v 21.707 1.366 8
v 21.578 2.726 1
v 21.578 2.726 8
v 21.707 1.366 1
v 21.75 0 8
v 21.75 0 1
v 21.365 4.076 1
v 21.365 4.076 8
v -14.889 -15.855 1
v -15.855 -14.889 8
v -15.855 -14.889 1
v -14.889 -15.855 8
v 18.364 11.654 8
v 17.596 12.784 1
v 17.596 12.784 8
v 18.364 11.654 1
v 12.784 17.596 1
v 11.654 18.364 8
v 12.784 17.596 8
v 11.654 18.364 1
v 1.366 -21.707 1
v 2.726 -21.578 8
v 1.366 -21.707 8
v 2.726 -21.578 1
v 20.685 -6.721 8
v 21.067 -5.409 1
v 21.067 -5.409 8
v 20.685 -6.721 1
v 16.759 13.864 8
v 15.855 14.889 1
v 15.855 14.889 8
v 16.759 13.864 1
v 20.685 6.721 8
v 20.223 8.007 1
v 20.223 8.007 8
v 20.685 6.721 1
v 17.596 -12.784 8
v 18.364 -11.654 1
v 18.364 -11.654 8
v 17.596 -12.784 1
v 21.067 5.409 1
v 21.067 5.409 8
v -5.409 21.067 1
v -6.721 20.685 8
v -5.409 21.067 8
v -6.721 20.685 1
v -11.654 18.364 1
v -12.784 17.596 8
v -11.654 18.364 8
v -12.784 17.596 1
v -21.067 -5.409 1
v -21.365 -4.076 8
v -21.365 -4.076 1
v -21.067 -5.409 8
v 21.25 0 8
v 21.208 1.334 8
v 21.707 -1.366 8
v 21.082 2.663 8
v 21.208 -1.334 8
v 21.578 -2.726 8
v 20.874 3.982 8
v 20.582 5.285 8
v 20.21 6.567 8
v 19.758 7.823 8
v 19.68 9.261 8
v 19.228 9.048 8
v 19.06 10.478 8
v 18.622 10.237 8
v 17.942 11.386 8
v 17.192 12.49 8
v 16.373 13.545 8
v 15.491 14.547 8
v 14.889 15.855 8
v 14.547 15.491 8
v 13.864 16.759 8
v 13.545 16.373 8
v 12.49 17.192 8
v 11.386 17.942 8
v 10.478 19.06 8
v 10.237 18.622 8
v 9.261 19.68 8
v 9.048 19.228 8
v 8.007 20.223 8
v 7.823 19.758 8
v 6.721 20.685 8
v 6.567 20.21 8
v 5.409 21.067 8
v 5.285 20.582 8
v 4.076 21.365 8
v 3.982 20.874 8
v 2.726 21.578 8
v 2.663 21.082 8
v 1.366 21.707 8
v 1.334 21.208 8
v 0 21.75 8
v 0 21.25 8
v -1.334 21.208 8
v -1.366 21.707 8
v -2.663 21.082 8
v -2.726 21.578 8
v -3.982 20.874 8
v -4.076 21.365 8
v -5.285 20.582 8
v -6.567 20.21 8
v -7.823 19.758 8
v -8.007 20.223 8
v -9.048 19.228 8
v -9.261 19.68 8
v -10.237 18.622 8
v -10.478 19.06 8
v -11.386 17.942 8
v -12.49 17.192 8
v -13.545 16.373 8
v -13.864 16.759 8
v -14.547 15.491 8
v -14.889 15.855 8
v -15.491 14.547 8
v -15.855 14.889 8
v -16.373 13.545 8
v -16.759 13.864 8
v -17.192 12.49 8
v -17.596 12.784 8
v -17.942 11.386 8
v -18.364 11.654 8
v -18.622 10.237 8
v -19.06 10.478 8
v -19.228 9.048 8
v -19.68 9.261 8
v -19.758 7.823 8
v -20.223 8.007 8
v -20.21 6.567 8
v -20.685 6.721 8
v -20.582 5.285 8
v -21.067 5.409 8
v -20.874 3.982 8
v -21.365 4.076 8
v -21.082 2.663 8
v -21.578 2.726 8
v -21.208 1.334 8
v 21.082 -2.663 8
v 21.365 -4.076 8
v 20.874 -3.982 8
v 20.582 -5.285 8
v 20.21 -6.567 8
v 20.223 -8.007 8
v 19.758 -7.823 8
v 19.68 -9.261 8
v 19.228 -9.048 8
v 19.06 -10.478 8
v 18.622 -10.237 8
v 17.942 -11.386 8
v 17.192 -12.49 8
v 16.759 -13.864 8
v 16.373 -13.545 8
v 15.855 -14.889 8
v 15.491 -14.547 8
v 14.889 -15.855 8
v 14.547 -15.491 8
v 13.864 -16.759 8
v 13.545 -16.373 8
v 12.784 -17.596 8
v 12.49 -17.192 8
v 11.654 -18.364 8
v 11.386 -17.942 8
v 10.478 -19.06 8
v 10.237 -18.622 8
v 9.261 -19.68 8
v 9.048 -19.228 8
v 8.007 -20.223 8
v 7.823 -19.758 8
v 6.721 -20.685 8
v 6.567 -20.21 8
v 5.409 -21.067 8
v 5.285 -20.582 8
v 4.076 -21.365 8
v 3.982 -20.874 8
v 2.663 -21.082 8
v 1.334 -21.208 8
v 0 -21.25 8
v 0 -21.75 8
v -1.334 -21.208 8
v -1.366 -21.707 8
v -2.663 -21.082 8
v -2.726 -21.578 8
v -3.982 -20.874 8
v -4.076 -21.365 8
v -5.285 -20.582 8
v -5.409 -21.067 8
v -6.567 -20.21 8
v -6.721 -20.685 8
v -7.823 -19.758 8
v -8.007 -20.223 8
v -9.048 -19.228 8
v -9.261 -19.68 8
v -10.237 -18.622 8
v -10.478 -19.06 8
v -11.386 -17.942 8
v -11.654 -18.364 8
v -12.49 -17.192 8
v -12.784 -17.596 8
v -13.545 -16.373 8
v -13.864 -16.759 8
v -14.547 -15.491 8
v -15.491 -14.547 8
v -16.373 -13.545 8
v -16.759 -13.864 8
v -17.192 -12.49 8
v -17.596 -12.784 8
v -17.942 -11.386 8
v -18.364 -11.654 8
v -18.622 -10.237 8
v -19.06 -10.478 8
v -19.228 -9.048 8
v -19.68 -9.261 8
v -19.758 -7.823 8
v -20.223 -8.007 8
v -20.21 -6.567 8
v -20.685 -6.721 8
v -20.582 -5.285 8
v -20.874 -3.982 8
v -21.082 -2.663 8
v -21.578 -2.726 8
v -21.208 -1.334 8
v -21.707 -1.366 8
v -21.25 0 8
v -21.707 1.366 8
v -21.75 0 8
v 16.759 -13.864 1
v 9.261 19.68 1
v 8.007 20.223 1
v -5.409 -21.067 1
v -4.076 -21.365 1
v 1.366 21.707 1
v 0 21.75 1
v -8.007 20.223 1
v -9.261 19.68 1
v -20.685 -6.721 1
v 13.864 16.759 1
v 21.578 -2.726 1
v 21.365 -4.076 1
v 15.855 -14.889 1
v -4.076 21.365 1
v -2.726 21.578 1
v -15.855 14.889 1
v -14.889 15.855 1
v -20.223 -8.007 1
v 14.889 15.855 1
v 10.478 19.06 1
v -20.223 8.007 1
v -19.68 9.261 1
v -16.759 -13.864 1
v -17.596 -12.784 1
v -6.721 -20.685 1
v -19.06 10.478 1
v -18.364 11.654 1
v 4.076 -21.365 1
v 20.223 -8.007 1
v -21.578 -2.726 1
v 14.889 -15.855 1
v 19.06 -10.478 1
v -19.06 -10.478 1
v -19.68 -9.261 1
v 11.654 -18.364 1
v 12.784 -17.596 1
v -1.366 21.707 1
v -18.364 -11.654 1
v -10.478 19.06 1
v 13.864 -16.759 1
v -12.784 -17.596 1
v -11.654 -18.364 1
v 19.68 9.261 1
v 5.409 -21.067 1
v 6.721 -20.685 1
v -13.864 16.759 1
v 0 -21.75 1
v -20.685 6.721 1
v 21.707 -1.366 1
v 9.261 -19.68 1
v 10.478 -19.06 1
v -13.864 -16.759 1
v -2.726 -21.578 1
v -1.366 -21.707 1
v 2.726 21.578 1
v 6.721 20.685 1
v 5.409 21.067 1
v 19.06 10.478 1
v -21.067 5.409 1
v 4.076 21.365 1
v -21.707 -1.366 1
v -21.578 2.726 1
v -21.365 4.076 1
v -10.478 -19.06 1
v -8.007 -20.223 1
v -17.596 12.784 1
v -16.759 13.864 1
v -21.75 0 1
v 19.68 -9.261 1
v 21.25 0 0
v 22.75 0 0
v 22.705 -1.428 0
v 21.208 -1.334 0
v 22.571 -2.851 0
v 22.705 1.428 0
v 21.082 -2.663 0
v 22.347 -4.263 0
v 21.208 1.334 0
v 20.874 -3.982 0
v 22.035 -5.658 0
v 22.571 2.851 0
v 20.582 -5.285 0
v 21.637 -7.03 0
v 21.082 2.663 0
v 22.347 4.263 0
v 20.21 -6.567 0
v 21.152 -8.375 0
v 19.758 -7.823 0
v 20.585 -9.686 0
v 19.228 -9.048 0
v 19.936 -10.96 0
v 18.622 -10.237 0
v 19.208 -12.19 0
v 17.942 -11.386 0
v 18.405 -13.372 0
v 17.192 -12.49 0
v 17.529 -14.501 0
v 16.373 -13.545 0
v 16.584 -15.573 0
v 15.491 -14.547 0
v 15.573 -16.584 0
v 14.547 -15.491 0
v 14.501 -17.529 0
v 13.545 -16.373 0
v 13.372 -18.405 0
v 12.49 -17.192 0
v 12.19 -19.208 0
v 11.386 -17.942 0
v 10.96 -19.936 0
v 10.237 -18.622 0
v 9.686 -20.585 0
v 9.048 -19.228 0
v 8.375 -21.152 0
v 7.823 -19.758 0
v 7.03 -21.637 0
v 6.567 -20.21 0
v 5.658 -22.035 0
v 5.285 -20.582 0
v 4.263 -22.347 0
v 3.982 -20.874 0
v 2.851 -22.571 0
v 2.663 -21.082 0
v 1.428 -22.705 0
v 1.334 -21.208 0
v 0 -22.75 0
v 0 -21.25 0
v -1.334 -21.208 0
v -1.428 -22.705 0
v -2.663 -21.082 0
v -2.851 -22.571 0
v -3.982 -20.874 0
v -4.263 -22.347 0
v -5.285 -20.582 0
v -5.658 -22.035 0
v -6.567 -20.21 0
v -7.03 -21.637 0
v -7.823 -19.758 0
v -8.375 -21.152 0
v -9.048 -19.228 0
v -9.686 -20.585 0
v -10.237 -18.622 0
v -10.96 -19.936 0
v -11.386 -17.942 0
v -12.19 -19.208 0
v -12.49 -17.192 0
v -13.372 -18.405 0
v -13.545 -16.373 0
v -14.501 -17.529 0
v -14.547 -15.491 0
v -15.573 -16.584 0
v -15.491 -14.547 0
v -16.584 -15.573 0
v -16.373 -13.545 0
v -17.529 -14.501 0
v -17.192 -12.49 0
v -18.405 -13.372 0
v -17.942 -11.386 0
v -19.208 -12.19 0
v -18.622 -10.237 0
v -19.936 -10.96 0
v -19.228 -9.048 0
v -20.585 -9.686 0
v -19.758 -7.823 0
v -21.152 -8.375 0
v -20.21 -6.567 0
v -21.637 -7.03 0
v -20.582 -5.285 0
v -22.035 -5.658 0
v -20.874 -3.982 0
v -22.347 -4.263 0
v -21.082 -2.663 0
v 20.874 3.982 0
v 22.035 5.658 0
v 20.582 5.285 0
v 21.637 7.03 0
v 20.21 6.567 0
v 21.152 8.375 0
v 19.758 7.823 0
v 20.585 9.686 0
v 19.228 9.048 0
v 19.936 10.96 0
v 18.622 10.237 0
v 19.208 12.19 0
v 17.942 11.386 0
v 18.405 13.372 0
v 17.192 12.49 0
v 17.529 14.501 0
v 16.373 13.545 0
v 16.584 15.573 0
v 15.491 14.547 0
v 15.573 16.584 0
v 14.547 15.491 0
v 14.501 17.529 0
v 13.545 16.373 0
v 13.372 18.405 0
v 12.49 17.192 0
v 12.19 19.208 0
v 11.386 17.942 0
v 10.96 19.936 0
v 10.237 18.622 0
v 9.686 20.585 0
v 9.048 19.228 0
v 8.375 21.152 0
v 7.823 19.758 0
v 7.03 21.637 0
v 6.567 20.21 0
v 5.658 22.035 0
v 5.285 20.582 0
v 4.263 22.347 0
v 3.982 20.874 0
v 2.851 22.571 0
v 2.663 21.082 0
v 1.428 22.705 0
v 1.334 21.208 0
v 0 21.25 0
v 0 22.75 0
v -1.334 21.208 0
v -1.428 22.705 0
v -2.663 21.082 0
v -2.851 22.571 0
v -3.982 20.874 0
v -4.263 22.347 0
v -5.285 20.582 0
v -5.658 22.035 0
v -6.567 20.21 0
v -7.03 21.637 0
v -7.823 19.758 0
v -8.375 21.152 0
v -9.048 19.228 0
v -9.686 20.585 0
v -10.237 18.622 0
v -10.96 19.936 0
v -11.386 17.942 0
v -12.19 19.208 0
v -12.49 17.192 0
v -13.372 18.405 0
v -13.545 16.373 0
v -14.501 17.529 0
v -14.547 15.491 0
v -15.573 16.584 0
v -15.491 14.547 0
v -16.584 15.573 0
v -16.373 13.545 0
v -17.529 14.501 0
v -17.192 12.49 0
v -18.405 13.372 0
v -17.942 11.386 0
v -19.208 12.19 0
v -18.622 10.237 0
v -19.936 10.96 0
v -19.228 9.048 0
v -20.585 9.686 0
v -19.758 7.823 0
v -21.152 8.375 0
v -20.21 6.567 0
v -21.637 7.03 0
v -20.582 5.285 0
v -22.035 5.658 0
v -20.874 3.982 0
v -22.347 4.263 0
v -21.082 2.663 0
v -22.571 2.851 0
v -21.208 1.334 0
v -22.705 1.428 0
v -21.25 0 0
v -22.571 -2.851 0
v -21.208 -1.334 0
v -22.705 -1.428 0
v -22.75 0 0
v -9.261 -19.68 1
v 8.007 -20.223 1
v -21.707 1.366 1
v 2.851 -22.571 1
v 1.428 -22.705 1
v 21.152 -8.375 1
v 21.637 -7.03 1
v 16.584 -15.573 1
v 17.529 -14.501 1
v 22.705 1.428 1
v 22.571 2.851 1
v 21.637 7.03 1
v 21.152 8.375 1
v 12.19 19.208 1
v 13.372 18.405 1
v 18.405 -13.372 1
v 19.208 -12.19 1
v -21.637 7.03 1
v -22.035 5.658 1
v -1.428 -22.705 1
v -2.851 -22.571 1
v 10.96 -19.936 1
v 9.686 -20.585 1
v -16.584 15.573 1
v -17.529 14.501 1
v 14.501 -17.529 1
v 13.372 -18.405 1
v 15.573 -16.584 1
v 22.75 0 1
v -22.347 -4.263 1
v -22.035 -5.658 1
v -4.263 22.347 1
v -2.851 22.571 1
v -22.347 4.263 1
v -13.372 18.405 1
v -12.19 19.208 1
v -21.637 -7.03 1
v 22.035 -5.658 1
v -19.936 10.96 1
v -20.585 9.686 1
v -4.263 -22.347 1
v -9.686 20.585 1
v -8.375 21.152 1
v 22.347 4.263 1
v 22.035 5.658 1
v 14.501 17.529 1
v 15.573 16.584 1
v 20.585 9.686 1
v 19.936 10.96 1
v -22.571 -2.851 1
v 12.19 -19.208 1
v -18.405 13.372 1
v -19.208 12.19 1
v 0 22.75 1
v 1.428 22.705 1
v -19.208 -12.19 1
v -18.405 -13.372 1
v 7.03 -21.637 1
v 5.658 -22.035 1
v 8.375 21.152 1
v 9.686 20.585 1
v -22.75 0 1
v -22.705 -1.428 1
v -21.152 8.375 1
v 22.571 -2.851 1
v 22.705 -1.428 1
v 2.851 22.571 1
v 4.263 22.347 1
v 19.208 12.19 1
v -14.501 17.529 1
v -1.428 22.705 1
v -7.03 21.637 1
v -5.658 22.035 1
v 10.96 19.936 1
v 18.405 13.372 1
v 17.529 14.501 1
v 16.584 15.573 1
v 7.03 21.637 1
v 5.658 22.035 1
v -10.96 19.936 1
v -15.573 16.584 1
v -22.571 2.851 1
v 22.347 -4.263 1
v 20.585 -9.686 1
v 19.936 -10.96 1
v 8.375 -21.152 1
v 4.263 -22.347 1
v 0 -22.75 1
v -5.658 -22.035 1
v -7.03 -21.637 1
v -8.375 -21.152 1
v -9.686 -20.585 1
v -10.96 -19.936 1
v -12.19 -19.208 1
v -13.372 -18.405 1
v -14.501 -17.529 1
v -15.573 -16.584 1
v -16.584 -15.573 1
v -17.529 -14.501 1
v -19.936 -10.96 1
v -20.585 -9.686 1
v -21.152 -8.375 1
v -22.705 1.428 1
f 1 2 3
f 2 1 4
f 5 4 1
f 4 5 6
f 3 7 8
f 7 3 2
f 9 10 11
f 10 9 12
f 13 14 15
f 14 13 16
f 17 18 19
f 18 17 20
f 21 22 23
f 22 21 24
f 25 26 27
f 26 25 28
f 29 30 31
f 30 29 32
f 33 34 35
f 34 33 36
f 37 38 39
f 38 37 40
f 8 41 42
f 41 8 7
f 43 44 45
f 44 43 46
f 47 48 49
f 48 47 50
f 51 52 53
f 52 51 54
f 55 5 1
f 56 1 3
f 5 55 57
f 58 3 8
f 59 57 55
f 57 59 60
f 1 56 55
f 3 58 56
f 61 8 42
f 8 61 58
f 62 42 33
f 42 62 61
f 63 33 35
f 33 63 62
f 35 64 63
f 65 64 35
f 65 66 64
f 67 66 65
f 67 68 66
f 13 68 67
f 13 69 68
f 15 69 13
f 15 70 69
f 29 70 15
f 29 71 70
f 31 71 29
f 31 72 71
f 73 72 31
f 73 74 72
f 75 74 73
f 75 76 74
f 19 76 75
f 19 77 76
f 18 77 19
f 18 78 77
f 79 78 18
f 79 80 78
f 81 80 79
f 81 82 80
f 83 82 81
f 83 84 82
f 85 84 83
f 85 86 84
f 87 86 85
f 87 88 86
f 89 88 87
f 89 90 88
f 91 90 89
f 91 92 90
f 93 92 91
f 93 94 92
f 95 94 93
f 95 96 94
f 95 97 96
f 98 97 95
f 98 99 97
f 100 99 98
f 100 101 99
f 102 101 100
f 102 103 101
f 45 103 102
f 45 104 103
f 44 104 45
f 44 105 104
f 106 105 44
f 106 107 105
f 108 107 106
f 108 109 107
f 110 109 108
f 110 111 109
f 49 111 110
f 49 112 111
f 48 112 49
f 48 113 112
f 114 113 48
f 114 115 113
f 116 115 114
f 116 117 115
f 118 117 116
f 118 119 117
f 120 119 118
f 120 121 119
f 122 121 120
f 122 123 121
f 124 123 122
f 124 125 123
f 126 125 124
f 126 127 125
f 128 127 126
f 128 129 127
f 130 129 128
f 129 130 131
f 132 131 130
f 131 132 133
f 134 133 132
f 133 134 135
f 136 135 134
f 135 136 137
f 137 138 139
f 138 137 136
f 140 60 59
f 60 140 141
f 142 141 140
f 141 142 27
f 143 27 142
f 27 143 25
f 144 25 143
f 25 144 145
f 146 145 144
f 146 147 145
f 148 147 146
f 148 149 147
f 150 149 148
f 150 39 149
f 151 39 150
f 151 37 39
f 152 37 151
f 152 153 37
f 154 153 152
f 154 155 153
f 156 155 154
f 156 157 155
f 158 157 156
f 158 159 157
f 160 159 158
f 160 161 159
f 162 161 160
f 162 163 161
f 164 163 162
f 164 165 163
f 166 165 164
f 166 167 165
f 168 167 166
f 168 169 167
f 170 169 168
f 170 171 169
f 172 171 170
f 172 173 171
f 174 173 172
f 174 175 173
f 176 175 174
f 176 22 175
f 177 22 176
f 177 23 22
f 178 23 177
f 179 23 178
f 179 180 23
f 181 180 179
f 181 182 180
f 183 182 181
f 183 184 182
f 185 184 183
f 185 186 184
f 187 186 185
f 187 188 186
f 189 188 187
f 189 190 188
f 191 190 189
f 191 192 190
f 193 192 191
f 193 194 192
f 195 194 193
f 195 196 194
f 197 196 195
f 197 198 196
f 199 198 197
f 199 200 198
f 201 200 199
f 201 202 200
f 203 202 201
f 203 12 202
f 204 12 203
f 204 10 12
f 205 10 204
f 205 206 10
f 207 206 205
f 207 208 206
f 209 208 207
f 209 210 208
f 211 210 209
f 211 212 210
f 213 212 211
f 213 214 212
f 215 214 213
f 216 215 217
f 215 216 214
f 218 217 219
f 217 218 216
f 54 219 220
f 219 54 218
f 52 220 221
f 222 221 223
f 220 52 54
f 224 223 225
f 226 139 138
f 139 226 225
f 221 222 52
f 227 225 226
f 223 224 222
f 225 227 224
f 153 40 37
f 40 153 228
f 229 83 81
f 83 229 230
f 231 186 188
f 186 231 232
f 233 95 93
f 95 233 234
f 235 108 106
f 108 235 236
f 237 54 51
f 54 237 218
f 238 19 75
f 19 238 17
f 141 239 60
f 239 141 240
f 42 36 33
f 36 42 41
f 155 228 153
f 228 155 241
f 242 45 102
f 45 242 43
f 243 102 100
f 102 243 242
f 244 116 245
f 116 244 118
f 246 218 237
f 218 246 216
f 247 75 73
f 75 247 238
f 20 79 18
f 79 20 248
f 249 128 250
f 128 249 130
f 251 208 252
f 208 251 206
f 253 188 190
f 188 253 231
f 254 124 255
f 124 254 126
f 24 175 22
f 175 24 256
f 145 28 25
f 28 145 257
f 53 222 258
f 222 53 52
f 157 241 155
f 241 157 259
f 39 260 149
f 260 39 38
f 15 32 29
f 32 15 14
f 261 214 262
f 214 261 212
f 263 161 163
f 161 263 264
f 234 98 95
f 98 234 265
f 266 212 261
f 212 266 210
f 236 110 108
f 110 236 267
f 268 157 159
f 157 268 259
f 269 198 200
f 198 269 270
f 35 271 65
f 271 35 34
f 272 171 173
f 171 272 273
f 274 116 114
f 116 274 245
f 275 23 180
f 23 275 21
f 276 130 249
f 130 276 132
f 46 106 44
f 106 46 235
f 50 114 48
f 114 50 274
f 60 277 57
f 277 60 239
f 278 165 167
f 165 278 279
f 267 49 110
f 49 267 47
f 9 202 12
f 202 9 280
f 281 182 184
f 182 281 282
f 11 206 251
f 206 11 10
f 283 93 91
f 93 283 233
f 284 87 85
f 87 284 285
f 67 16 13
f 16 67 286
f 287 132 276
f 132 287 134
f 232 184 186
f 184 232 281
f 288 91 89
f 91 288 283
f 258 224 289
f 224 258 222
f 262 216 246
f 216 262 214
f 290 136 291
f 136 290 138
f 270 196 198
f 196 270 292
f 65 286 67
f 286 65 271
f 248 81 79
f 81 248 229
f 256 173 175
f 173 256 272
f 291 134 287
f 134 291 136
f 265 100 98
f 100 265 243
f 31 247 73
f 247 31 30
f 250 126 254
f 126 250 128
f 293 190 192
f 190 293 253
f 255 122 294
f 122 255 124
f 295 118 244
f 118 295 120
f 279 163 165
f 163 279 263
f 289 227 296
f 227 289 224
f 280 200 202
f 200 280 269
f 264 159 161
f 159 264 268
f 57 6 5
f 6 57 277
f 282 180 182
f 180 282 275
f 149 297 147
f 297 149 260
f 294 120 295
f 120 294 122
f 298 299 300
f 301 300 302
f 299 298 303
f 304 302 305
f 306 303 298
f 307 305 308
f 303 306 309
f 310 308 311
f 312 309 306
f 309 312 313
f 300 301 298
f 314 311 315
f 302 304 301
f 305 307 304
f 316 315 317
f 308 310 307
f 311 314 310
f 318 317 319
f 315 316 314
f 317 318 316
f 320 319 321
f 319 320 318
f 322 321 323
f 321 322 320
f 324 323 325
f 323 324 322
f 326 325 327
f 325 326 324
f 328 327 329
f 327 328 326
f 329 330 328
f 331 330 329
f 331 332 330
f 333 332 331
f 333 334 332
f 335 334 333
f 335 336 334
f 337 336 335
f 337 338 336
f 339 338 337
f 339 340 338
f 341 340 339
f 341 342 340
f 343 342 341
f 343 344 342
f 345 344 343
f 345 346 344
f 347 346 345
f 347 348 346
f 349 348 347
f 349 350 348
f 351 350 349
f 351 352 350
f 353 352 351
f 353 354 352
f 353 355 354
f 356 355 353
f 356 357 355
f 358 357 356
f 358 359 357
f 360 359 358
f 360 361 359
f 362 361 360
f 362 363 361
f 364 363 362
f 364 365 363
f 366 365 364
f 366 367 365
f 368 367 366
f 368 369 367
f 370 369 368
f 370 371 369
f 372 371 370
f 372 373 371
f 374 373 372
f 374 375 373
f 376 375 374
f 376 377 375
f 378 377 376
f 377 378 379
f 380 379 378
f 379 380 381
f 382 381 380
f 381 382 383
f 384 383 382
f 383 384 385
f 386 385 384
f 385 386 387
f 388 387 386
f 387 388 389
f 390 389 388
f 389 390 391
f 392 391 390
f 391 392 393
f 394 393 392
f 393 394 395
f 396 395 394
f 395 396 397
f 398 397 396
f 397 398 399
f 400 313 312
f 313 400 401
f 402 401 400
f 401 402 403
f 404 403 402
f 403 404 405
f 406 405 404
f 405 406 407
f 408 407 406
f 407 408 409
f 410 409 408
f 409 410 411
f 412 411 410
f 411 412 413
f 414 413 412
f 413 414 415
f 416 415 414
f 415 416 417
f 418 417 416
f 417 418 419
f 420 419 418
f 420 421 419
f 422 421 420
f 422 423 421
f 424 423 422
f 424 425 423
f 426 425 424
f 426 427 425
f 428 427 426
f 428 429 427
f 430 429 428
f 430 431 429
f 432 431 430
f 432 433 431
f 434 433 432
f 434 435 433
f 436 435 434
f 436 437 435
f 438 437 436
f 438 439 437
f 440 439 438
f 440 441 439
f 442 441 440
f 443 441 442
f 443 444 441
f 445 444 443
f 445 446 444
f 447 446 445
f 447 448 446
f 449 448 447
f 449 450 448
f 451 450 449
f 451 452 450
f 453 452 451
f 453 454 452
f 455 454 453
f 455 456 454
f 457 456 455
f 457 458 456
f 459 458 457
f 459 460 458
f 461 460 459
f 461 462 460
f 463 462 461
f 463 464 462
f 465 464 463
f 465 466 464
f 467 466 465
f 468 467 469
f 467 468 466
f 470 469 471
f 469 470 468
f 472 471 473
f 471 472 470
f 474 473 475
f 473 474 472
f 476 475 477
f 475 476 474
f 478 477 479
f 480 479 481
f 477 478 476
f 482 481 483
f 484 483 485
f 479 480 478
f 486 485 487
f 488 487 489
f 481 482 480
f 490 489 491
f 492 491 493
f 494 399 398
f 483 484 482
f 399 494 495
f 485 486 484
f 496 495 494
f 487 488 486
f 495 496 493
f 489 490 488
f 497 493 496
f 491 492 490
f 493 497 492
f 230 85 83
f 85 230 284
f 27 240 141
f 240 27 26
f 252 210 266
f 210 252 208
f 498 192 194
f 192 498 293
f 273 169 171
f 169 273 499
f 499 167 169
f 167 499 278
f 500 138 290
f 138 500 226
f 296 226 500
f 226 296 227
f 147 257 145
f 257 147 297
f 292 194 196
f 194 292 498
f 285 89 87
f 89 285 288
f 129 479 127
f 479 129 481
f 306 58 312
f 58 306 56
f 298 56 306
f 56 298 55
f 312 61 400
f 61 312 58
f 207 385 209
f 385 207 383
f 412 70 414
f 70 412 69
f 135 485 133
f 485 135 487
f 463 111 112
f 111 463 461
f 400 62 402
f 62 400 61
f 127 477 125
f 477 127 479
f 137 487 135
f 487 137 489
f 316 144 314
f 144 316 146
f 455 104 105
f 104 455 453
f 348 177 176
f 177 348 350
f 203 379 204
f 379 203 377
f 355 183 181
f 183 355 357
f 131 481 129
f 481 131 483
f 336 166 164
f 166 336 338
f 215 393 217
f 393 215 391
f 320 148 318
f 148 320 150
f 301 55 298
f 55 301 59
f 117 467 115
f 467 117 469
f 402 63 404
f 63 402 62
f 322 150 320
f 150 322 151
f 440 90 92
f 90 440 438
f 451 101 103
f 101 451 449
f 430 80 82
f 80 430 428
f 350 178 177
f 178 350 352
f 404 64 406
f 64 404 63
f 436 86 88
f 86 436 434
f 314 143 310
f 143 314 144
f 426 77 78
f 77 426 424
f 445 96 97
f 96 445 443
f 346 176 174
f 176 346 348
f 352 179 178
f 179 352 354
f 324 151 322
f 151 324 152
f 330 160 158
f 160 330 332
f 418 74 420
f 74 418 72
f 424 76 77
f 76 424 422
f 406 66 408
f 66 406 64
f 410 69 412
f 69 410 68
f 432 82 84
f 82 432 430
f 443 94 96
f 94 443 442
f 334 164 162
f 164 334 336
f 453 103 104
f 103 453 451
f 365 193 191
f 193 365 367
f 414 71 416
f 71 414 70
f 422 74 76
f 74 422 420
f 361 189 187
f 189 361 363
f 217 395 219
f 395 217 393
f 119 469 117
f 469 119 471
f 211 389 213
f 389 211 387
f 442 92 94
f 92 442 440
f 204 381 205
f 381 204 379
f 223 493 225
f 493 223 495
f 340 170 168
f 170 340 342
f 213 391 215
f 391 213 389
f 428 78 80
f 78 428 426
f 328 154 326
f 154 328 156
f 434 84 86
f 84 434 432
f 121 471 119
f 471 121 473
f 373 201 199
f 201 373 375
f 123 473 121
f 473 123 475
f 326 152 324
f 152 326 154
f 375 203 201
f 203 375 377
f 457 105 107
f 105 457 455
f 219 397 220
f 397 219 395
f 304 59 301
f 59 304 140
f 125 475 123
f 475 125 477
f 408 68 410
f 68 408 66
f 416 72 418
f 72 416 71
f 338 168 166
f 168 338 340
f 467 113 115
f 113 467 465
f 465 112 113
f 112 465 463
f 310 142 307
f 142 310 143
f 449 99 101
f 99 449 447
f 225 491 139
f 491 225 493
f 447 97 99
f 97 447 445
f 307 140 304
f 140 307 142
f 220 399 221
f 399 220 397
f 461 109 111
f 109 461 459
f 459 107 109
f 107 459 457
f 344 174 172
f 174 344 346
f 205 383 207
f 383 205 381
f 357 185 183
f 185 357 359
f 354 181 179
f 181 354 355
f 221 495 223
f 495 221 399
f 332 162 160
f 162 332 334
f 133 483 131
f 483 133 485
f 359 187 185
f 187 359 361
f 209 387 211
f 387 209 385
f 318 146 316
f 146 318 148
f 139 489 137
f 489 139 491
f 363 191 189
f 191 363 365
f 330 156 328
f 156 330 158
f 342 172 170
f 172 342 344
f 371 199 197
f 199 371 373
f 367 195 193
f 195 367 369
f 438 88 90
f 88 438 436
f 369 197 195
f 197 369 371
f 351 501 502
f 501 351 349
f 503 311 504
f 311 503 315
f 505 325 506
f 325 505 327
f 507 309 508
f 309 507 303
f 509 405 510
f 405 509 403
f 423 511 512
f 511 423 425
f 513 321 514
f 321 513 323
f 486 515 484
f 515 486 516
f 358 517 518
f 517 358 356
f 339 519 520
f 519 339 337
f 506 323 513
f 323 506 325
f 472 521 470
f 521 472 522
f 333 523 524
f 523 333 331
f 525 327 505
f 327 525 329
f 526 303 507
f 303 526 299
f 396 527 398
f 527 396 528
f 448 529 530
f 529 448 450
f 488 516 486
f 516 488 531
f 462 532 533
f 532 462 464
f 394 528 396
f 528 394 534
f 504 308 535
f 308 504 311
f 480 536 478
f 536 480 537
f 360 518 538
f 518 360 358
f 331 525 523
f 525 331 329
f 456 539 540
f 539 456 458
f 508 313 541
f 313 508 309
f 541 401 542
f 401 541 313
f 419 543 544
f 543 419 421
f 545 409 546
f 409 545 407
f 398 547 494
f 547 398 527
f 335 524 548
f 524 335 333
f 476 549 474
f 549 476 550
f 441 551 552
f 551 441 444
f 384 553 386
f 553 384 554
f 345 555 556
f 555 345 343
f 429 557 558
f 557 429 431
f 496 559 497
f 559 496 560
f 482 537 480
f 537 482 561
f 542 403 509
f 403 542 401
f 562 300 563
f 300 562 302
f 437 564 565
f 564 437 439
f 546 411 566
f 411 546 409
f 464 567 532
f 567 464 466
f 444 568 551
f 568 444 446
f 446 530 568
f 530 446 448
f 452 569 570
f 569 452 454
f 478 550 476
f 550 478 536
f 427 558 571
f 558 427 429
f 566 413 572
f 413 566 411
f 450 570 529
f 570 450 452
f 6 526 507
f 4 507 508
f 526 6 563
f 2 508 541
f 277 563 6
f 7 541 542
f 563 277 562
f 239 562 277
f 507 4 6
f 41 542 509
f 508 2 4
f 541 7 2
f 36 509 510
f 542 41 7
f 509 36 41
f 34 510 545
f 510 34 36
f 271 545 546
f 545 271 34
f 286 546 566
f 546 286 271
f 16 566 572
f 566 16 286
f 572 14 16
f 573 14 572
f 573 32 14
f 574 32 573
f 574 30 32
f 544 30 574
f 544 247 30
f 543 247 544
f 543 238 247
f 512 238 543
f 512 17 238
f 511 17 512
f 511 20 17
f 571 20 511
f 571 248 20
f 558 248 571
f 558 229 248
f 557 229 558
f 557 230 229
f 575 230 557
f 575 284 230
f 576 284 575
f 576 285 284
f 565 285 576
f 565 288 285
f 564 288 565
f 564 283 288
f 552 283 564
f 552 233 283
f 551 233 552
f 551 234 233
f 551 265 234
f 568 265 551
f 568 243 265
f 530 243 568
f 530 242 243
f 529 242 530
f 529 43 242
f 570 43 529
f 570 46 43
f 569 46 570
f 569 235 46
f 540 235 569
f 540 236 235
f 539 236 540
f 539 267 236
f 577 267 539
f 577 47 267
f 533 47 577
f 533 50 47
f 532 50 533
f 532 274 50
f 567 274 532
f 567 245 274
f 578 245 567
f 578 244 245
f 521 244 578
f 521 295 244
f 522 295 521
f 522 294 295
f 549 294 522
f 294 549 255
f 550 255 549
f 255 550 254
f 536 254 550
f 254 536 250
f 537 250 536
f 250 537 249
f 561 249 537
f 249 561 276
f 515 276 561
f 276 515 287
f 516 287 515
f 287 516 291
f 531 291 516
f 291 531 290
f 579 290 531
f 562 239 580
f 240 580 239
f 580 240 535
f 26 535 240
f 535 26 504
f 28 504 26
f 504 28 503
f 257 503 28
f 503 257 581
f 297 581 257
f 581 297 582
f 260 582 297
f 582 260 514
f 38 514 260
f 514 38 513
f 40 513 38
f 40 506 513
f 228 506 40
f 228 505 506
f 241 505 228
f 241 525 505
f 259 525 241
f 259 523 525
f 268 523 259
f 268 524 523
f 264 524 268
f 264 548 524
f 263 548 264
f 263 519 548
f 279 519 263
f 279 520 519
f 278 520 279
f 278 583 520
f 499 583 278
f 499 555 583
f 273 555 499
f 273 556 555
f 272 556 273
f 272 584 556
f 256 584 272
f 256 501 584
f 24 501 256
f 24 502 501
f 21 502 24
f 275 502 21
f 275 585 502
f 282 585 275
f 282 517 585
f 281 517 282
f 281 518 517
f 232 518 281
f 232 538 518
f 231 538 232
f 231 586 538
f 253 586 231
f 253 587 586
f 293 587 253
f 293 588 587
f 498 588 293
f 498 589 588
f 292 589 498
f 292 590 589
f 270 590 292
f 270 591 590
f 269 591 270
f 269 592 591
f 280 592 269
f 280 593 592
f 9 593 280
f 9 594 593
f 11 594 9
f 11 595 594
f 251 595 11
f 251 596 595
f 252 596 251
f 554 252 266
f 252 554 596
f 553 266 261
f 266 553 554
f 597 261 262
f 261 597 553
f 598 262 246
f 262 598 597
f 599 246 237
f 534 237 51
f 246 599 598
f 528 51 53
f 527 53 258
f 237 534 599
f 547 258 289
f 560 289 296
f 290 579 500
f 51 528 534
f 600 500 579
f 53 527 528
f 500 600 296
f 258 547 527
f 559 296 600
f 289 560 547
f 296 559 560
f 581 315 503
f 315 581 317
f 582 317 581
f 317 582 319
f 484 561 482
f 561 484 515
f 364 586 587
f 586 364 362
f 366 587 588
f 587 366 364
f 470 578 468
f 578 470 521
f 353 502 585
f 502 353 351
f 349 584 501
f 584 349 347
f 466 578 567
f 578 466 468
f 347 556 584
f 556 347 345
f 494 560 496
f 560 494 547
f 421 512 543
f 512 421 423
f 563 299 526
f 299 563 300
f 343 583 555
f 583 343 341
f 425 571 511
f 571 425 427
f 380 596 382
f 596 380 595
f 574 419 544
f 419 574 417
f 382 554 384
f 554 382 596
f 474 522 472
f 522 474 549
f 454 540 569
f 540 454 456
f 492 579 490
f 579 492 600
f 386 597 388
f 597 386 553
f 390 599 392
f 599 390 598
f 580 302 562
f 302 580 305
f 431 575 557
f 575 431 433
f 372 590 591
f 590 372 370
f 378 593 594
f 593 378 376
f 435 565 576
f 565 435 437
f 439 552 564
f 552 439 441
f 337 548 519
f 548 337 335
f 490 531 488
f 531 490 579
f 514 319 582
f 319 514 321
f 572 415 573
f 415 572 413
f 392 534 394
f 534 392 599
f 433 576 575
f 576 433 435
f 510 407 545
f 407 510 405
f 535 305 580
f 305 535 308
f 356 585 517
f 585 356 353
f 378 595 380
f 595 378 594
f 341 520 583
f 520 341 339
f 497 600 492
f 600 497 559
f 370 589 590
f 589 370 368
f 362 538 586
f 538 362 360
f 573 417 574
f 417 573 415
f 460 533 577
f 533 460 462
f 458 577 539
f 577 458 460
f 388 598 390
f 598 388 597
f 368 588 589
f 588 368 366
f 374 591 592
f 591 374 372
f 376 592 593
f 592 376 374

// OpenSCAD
// file: lib.scad
module middle(tube_diameter, adapter_length, adapter_thickness, ring_length, ring_thickness, resolution) {
    difference() {
        cylinder(d = tube_diameter, h = adapter_length, center = false, $fn = resolution);
        cylinder(d = tube_diameter - adapter_thickness, h = adapter_length, center = false, $fn = resolution);
    }

    difference() {
        cylinder(d = tube_diameter + ring_thickness, h = ring_length, center = false, $fn = resolution);
        cylinder(d = tube_diameter - adapter_thickness, h = ring_length, center = false, $fn = resolution);
    }
}

module front(tube_diameter, tube_thickness, ring_thickness, ring_length, front_plate_thickness, inner_length, bottle_diameter, bottle_offset, resolution) {
    difference() {
        cylinder(d = tube_diameter + ring_thickness, h = ring_length + front_plate_thickness, center = true, $fn = resolution);
        translate([0,0,front_plate_thickness/2]) 
            cylinder(d = tube_diameter, h = ring_length, center = true, $fn = resolution);
        translate([bottle_offset/2,0,-front_plate_thickness/2]) 
            cylinder(d = bottle_diameter, h = front_plate_thickness, center = true, $fn = resolution);
    }

    translate([0,0,(ring_length-front_plate_thickness)/2]) difference() {
        translate([0,0,inner_length/2]) 
            cylinder(d = tube_diameter - tube_thickness - 2, h = inner_length, center = true, $fn = resolution);
        translate([bottle_offset/2,0,inner_length/2]) 
            cylinder(d = bottle_diameter, h = inner_length, center = true, $fn = resolution);
    }
}

module rear(tube_diameter, tube_thickness, ring_thickness, inner_ring_thickness, ring_length, inner_ring_length, front_plate_thickness, chip_length, chip_platform_offset, chip_platform_thickness, usb_hole, resolution) {
    // ring and usb hole
    difference() {
        cylinder(d = tube_diameter + ring_thickness, h = ring_length + front_plate_thickness, center = true, $fn = resolution);
        
        translate([0,0,front_plate_thickness/2]) 
            cylinder(d = tube_diameter, h = ring_length, center = true, $fn = resolution);
        
        // usb hole
        translate([usb_hole/2,usb_hole/2,-front_plate_thickness/2]) 
            cylinder(d = usb_hole, h = front_plate_thickness, center = true, $fn = resolution);
        translate([usb_hole/2,-usb_hole/2,-front_plate_thickness/2]) 
            cylinder(d = usb_hole, h = front_plate_thickness, center = true, $fn = resolution);
        translate([usb_hole/2,0,-front_plate_thickness/2]) 
            cube(usb_hole, center = true);
    }

    // inner ring and chip platform
    difference() {
        inner_ring_remover_size = (chip_length < (tube_diameter - tube_thickness)) ? tube_diameter - tube_thickness : chip_length;
        inner_ring_remover_offset =  (usb_hole < chip_platform_offset) ? usb_hole : chip_platform_offset;

        // inner ring
        translate([0,0,chip_length/2]) 
            cylinder(d = tube_diameter - tube_thickness, h = chip_length, center = true, $fn = resolution);
        difference() {
            translate([0,0,chip_length/2]) 
                cylinder(d = tube_diameter - tube_thickness - inner_ring_thickness, h = chip_length, center = true, $fn = resolution);

            // chip platform
            translate([(tube_diameter - tube_thickness)/2 + chip_platform_offset,0,inner_ring_remover_size/2]) 
                cube(inner_ring_remover_size, center = true); 
        }
        
        // chip platform ring
        translate([0,0,chip_length/2]) 
            cylinder(d = tube_diameter - tube_thickness - inner_ring_thickness - chip_platform_thickness, h = chip_length, center = true, $fn = resolution);

        // upper inner ring thickness
        translate([-inner_ring_remover_size/2 + inner_ring_remover_offset/2,0,inner_ring_remover_size/2 + inner_ring_length])
            cube(inner_ring_remover_size, center = true);

        // inner ring recess
        translate([-inner_ring_remover_offset/2 + inner_ring_remover_offset/2,(inner_ring_remover_size - inner_ring_thickness)/2,inner_ring_remover_offset/2+1]) 
            cube(inner_ring_remover_offset, center = true);
        translate([-inner_ring_remover_offset/2 + inner_ring_remover_offset/2,-(inner_ring_remover_size - inner_ring_thickness)/2,inner_ring_remover_offset/2+1]) 
            cube(inner_ring_remover_offset, center = true);
    }
}
// main file
tube_diameter = 43.5;
adapter_length = 8;
adapter_thickness = 1;
ring_length = 1;
ring_thickness = 2;

resolution = 100;

use <lib.scad>;

middle(tube_diameter, adapter_length, adapter_thickness, ring_length, ring_thickness, resolution);
